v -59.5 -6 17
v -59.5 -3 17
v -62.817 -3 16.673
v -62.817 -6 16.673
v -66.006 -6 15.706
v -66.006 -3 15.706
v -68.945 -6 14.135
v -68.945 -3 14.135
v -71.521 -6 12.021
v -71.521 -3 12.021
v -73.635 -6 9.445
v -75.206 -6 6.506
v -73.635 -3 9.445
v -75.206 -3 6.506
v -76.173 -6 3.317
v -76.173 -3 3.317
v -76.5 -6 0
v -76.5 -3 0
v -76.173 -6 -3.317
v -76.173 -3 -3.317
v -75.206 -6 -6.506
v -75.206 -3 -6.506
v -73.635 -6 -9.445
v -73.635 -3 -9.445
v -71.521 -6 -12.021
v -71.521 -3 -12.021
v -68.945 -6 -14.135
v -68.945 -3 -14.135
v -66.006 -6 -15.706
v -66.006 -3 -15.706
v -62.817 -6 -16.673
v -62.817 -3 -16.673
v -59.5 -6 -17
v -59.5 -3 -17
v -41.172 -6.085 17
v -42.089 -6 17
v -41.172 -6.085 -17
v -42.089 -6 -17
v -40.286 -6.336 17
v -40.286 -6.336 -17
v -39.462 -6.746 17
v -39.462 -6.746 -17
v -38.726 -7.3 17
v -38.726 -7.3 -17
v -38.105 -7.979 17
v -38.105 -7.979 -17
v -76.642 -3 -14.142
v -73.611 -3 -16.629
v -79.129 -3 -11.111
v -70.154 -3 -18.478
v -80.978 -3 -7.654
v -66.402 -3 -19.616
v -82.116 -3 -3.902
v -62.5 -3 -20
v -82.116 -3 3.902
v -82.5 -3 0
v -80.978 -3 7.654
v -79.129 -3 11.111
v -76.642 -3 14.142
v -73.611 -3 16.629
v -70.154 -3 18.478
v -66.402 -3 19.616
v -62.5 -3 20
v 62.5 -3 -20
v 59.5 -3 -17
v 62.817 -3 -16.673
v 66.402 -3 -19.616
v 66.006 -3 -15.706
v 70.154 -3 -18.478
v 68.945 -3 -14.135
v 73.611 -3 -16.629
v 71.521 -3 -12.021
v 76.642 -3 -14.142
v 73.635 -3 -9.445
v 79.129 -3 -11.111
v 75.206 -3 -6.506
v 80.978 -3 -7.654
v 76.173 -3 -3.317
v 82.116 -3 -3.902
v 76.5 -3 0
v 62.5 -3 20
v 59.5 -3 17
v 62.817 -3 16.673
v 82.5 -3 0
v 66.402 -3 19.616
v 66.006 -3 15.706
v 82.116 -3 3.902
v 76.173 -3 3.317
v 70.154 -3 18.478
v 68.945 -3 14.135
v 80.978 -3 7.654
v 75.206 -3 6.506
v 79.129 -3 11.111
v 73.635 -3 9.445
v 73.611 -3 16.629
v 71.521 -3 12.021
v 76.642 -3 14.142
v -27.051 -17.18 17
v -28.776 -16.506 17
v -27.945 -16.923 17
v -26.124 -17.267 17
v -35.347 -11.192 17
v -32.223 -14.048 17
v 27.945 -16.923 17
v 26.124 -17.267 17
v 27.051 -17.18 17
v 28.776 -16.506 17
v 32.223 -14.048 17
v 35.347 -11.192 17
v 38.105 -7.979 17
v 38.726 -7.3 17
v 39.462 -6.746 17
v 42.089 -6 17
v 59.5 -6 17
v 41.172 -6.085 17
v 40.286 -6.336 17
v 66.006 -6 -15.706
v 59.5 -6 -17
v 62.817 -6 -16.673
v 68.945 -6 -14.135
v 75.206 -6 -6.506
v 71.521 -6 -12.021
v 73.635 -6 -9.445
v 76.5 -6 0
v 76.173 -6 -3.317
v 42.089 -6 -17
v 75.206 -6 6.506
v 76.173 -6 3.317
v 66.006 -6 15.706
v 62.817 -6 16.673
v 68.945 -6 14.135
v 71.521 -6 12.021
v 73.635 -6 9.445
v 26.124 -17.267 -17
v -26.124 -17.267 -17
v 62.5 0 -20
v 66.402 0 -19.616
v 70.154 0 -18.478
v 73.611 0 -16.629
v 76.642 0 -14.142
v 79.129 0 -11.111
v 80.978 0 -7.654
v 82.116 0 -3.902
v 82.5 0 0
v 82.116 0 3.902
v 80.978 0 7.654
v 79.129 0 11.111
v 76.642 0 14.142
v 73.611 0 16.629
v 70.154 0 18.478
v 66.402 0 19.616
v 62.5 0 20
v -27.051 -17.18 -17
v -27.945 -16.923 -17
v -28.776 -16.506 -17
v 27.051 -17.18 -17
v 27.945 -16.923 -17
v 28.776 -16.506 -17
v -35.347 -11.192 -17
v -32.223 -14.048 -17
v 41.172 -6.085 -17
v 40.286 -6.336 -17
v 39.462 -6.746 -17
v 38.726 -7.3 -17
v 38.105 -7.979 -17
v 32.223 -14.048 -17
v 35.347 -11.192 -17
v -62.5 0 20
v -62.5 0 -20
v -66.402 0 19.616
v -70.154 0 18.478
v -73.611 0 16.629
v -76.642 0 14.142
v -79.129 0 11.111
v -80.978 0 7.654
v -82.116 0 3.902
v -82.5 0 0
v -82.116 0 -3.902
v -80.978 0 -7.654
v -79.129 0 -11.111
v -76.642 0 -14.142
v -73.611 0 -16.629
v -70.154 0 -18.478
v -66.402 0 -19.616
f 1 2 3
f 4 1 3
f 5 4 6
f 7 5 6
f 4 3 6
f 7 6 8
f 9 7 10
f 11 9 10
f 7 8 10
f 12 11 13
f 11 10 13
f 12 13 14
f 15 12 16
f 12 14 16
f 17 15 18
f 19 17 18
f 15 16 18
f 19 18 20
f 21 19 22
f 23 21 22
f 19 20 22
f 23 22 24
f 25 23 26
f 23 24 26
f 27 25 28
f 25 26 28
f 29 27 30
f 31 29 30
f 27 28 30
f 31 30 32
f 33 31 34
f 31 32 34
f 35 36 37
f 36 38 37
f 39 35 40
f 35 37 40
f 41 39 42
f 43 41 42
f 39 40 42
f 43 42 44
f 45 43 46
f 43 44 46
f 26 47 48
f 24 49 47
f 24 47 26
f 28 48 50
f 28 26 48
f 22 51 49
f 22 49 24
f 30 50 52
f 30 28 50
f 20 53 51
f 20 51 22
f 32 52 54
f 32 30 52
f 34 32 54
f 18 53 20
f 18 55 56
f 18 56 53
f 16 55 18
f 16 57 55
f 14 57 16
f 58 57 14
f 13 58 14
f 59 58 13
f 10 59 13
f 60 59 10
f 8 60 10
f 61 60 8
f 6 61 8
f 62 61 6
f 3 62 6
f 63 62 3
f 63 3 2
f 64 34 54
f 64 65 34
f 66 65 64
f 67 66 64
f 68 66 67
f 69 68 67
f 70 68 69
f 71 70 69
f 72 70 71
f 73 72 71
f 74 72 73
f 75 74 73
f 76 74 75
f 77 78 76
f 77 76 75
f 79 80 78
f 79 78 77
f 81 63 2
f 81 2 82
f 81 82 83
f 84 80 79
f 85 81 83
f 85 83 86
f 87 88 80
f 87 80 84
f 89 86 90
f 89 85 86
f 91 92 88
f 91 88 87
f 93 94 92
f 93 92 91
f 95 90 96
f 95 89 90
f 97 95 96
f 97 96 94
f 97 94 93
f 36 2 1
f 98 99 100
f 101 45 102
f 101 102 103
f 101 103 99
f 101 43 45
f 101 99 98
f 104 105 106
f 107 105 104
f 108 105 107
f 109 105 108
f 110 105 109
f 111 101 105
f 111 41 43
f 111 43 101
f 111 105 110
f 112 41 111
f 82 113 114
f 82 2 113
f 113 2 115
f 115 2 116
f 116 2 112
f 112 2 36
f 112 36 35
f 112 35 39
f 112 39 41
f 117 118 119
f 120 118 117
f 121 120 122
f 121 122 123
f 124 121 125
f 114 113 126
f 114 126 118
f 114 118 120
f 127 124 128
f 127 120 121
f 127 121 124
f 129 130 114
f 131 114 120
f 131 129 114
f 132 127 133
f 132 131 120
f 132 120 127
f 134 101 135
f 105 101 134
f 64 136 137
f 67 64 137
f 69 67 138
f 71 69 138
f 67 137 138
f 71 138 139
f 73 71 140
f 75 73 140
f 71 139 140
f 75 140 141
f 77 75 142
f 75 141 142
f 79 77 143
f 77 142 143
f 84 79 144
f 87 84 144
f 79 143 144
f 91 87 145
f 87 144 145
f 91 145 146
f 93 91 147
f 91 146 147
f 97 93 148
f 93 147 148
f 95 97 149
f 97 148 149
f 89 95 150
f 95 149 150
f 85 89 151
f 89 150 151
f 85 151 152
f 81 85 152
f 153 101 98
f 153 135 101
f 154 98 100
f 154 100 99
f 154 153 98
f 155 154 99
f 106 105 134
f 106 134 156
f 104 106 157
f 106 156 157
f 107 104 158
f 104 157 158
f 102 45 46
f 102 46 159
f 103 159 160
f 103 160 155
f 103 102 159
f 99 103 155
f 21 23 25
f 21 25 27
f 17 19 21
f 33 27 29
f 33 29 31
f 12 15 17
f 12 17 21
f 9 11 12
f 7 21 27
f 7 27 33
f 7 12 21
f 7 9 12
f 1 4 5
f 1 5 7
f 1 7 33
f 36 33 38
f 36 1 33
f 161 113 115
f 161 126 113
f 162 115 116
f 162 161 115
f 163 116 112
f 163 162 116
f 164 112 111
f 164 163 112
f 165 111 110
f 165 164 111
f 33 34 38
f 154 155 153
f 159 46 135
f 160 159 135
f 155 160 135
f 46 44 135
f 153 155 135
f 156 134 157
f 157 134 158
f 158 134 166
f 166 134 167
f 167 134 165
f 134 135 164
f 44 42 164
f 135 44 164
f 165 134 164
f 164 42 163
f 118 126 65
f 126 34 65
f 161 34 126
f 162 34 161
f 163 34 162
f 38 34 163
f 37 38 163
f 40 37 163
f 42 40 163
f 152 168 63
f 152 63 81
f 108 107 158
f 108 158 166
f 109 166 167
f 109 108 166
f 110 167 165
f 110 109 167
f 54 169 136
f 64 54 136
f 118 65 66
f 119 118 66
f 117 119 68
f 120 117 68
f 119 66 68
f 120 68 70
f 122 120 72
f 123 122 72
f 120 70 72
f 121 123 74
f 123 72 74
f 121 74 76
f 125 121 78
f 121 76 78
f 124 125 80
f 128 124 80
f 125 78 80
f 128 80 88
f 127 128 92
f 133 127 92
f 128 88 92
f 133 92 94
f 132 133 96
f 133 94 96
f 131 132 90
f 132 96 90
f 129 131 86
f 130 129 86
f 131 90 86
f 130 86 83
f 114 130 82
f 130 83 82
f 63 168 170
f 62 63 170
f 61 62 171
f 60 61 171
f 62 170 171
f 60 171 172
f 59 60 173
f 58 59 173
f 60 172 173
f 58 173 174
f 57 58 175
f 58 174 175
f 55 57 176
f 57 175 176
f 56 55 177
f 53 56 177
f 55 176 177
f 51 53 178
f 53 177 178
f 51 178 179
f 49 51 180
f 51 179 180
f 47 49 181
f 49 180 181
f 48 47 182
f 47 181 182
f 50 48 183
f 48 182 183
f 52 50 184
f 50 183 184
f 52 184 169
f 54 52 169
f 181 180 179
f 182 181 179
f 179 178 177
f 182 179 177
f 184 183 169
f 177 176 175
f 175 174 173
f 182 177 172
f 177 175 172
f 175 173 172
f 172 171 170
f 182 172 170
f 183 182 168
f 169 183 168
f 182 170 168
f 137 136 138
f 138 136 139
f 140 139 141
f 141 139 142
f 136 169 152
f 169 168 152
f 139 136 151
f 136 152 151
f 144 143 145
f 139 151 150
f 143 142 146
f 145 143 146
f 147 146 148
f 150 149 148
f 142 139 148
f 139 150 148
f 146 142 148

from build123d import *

# Parameters (mm, degrees)
F0_W     = 125
F0_H     = 40
F1_DEPTH = 3
F2_W     = 119
F2_H     = 34
F3_DEPTH = 3
F4_W     = 55
F4_H     = 14.9112120271
F5_DEPTH = 34
F6_R     = 5


with BuildPart() as f1:
    # F0 (on Front) → F1 (new body)
    with BuildSketch(Plane.XZ):
        Rectangle(F0_W, F0_H)
        with BuildLine():
            ThreePointArc((62.5, -20), (82.5, 0), (62.5, 20))
            Line((62.5, 20), (62.5, -20))
        make_face()
        with BuildLine():
            Line((-62.5, -20), (-62.5, 20))
            ThreePointArc((-62.5, 20), (-82.5, 0), (-62.5, -20))
        make_face()
    extrude(amount=F1_DEPTH)

    # F2 (on face) → F3 (join)
    with BuildSketch(Plane.XZ.offset(3)):
        Rectangle(F2_W, F2_H)
        with BuildLine():
            ThreePointArc((59.5, -17), (76.5, 0), (59.5, 17))
            Line((59.5, 17), (59.5, -17))
        make_face()
        with BuildLine():
            Line((-59.5, -17), (-59.5, 17))
            ThreePointArc((-59.5, 17), (-76.5, 0), (-59.5, -17))
        make_face()
    extrude(amount=F3_DEPTH)

    # F4 (on face) → F5 (join)
    with BuildSketch(Plane.XY.offset(17)):
        with Locations((0, -9.8109263927)):
            Rectangle(F4_W, F4_H)
        with BuildLine():
            ThreePointArc((-39.5, -6), (-34.1717325339, -12.3487294988), (-27.5, -17.2665324062))
            Line((-27.5, -17.2665324062), (-27.5, -2.3553203791))
            Line((-27.5, -2.3553203791), (-39.5, -6))
        make_face()
        with BuildLine():
            Line((27.5, -2.3553203791), (27.5, -17.2665324062))
            ThreePointArc((27.5, -17.2665324062), (34.1717325339, -12.3487294988), (39.5, -6))
            Line((39.5, -6), (27.5, -2.3553203791))
        make_face()
    extrude(amount=-F5_DEPTH)

    # F6
    f6_edges = [f1.edges().sort_by_distance(p)[0] for p in [
        (-27.5, -17.266532, 0),
        (27.5, -17.266532, 0),
        (39.5, -6, 0),
        (-39.5, -6, 0),
    ]]
    fillet(f6_edges, radius=F6_R)


solid = f1.part
